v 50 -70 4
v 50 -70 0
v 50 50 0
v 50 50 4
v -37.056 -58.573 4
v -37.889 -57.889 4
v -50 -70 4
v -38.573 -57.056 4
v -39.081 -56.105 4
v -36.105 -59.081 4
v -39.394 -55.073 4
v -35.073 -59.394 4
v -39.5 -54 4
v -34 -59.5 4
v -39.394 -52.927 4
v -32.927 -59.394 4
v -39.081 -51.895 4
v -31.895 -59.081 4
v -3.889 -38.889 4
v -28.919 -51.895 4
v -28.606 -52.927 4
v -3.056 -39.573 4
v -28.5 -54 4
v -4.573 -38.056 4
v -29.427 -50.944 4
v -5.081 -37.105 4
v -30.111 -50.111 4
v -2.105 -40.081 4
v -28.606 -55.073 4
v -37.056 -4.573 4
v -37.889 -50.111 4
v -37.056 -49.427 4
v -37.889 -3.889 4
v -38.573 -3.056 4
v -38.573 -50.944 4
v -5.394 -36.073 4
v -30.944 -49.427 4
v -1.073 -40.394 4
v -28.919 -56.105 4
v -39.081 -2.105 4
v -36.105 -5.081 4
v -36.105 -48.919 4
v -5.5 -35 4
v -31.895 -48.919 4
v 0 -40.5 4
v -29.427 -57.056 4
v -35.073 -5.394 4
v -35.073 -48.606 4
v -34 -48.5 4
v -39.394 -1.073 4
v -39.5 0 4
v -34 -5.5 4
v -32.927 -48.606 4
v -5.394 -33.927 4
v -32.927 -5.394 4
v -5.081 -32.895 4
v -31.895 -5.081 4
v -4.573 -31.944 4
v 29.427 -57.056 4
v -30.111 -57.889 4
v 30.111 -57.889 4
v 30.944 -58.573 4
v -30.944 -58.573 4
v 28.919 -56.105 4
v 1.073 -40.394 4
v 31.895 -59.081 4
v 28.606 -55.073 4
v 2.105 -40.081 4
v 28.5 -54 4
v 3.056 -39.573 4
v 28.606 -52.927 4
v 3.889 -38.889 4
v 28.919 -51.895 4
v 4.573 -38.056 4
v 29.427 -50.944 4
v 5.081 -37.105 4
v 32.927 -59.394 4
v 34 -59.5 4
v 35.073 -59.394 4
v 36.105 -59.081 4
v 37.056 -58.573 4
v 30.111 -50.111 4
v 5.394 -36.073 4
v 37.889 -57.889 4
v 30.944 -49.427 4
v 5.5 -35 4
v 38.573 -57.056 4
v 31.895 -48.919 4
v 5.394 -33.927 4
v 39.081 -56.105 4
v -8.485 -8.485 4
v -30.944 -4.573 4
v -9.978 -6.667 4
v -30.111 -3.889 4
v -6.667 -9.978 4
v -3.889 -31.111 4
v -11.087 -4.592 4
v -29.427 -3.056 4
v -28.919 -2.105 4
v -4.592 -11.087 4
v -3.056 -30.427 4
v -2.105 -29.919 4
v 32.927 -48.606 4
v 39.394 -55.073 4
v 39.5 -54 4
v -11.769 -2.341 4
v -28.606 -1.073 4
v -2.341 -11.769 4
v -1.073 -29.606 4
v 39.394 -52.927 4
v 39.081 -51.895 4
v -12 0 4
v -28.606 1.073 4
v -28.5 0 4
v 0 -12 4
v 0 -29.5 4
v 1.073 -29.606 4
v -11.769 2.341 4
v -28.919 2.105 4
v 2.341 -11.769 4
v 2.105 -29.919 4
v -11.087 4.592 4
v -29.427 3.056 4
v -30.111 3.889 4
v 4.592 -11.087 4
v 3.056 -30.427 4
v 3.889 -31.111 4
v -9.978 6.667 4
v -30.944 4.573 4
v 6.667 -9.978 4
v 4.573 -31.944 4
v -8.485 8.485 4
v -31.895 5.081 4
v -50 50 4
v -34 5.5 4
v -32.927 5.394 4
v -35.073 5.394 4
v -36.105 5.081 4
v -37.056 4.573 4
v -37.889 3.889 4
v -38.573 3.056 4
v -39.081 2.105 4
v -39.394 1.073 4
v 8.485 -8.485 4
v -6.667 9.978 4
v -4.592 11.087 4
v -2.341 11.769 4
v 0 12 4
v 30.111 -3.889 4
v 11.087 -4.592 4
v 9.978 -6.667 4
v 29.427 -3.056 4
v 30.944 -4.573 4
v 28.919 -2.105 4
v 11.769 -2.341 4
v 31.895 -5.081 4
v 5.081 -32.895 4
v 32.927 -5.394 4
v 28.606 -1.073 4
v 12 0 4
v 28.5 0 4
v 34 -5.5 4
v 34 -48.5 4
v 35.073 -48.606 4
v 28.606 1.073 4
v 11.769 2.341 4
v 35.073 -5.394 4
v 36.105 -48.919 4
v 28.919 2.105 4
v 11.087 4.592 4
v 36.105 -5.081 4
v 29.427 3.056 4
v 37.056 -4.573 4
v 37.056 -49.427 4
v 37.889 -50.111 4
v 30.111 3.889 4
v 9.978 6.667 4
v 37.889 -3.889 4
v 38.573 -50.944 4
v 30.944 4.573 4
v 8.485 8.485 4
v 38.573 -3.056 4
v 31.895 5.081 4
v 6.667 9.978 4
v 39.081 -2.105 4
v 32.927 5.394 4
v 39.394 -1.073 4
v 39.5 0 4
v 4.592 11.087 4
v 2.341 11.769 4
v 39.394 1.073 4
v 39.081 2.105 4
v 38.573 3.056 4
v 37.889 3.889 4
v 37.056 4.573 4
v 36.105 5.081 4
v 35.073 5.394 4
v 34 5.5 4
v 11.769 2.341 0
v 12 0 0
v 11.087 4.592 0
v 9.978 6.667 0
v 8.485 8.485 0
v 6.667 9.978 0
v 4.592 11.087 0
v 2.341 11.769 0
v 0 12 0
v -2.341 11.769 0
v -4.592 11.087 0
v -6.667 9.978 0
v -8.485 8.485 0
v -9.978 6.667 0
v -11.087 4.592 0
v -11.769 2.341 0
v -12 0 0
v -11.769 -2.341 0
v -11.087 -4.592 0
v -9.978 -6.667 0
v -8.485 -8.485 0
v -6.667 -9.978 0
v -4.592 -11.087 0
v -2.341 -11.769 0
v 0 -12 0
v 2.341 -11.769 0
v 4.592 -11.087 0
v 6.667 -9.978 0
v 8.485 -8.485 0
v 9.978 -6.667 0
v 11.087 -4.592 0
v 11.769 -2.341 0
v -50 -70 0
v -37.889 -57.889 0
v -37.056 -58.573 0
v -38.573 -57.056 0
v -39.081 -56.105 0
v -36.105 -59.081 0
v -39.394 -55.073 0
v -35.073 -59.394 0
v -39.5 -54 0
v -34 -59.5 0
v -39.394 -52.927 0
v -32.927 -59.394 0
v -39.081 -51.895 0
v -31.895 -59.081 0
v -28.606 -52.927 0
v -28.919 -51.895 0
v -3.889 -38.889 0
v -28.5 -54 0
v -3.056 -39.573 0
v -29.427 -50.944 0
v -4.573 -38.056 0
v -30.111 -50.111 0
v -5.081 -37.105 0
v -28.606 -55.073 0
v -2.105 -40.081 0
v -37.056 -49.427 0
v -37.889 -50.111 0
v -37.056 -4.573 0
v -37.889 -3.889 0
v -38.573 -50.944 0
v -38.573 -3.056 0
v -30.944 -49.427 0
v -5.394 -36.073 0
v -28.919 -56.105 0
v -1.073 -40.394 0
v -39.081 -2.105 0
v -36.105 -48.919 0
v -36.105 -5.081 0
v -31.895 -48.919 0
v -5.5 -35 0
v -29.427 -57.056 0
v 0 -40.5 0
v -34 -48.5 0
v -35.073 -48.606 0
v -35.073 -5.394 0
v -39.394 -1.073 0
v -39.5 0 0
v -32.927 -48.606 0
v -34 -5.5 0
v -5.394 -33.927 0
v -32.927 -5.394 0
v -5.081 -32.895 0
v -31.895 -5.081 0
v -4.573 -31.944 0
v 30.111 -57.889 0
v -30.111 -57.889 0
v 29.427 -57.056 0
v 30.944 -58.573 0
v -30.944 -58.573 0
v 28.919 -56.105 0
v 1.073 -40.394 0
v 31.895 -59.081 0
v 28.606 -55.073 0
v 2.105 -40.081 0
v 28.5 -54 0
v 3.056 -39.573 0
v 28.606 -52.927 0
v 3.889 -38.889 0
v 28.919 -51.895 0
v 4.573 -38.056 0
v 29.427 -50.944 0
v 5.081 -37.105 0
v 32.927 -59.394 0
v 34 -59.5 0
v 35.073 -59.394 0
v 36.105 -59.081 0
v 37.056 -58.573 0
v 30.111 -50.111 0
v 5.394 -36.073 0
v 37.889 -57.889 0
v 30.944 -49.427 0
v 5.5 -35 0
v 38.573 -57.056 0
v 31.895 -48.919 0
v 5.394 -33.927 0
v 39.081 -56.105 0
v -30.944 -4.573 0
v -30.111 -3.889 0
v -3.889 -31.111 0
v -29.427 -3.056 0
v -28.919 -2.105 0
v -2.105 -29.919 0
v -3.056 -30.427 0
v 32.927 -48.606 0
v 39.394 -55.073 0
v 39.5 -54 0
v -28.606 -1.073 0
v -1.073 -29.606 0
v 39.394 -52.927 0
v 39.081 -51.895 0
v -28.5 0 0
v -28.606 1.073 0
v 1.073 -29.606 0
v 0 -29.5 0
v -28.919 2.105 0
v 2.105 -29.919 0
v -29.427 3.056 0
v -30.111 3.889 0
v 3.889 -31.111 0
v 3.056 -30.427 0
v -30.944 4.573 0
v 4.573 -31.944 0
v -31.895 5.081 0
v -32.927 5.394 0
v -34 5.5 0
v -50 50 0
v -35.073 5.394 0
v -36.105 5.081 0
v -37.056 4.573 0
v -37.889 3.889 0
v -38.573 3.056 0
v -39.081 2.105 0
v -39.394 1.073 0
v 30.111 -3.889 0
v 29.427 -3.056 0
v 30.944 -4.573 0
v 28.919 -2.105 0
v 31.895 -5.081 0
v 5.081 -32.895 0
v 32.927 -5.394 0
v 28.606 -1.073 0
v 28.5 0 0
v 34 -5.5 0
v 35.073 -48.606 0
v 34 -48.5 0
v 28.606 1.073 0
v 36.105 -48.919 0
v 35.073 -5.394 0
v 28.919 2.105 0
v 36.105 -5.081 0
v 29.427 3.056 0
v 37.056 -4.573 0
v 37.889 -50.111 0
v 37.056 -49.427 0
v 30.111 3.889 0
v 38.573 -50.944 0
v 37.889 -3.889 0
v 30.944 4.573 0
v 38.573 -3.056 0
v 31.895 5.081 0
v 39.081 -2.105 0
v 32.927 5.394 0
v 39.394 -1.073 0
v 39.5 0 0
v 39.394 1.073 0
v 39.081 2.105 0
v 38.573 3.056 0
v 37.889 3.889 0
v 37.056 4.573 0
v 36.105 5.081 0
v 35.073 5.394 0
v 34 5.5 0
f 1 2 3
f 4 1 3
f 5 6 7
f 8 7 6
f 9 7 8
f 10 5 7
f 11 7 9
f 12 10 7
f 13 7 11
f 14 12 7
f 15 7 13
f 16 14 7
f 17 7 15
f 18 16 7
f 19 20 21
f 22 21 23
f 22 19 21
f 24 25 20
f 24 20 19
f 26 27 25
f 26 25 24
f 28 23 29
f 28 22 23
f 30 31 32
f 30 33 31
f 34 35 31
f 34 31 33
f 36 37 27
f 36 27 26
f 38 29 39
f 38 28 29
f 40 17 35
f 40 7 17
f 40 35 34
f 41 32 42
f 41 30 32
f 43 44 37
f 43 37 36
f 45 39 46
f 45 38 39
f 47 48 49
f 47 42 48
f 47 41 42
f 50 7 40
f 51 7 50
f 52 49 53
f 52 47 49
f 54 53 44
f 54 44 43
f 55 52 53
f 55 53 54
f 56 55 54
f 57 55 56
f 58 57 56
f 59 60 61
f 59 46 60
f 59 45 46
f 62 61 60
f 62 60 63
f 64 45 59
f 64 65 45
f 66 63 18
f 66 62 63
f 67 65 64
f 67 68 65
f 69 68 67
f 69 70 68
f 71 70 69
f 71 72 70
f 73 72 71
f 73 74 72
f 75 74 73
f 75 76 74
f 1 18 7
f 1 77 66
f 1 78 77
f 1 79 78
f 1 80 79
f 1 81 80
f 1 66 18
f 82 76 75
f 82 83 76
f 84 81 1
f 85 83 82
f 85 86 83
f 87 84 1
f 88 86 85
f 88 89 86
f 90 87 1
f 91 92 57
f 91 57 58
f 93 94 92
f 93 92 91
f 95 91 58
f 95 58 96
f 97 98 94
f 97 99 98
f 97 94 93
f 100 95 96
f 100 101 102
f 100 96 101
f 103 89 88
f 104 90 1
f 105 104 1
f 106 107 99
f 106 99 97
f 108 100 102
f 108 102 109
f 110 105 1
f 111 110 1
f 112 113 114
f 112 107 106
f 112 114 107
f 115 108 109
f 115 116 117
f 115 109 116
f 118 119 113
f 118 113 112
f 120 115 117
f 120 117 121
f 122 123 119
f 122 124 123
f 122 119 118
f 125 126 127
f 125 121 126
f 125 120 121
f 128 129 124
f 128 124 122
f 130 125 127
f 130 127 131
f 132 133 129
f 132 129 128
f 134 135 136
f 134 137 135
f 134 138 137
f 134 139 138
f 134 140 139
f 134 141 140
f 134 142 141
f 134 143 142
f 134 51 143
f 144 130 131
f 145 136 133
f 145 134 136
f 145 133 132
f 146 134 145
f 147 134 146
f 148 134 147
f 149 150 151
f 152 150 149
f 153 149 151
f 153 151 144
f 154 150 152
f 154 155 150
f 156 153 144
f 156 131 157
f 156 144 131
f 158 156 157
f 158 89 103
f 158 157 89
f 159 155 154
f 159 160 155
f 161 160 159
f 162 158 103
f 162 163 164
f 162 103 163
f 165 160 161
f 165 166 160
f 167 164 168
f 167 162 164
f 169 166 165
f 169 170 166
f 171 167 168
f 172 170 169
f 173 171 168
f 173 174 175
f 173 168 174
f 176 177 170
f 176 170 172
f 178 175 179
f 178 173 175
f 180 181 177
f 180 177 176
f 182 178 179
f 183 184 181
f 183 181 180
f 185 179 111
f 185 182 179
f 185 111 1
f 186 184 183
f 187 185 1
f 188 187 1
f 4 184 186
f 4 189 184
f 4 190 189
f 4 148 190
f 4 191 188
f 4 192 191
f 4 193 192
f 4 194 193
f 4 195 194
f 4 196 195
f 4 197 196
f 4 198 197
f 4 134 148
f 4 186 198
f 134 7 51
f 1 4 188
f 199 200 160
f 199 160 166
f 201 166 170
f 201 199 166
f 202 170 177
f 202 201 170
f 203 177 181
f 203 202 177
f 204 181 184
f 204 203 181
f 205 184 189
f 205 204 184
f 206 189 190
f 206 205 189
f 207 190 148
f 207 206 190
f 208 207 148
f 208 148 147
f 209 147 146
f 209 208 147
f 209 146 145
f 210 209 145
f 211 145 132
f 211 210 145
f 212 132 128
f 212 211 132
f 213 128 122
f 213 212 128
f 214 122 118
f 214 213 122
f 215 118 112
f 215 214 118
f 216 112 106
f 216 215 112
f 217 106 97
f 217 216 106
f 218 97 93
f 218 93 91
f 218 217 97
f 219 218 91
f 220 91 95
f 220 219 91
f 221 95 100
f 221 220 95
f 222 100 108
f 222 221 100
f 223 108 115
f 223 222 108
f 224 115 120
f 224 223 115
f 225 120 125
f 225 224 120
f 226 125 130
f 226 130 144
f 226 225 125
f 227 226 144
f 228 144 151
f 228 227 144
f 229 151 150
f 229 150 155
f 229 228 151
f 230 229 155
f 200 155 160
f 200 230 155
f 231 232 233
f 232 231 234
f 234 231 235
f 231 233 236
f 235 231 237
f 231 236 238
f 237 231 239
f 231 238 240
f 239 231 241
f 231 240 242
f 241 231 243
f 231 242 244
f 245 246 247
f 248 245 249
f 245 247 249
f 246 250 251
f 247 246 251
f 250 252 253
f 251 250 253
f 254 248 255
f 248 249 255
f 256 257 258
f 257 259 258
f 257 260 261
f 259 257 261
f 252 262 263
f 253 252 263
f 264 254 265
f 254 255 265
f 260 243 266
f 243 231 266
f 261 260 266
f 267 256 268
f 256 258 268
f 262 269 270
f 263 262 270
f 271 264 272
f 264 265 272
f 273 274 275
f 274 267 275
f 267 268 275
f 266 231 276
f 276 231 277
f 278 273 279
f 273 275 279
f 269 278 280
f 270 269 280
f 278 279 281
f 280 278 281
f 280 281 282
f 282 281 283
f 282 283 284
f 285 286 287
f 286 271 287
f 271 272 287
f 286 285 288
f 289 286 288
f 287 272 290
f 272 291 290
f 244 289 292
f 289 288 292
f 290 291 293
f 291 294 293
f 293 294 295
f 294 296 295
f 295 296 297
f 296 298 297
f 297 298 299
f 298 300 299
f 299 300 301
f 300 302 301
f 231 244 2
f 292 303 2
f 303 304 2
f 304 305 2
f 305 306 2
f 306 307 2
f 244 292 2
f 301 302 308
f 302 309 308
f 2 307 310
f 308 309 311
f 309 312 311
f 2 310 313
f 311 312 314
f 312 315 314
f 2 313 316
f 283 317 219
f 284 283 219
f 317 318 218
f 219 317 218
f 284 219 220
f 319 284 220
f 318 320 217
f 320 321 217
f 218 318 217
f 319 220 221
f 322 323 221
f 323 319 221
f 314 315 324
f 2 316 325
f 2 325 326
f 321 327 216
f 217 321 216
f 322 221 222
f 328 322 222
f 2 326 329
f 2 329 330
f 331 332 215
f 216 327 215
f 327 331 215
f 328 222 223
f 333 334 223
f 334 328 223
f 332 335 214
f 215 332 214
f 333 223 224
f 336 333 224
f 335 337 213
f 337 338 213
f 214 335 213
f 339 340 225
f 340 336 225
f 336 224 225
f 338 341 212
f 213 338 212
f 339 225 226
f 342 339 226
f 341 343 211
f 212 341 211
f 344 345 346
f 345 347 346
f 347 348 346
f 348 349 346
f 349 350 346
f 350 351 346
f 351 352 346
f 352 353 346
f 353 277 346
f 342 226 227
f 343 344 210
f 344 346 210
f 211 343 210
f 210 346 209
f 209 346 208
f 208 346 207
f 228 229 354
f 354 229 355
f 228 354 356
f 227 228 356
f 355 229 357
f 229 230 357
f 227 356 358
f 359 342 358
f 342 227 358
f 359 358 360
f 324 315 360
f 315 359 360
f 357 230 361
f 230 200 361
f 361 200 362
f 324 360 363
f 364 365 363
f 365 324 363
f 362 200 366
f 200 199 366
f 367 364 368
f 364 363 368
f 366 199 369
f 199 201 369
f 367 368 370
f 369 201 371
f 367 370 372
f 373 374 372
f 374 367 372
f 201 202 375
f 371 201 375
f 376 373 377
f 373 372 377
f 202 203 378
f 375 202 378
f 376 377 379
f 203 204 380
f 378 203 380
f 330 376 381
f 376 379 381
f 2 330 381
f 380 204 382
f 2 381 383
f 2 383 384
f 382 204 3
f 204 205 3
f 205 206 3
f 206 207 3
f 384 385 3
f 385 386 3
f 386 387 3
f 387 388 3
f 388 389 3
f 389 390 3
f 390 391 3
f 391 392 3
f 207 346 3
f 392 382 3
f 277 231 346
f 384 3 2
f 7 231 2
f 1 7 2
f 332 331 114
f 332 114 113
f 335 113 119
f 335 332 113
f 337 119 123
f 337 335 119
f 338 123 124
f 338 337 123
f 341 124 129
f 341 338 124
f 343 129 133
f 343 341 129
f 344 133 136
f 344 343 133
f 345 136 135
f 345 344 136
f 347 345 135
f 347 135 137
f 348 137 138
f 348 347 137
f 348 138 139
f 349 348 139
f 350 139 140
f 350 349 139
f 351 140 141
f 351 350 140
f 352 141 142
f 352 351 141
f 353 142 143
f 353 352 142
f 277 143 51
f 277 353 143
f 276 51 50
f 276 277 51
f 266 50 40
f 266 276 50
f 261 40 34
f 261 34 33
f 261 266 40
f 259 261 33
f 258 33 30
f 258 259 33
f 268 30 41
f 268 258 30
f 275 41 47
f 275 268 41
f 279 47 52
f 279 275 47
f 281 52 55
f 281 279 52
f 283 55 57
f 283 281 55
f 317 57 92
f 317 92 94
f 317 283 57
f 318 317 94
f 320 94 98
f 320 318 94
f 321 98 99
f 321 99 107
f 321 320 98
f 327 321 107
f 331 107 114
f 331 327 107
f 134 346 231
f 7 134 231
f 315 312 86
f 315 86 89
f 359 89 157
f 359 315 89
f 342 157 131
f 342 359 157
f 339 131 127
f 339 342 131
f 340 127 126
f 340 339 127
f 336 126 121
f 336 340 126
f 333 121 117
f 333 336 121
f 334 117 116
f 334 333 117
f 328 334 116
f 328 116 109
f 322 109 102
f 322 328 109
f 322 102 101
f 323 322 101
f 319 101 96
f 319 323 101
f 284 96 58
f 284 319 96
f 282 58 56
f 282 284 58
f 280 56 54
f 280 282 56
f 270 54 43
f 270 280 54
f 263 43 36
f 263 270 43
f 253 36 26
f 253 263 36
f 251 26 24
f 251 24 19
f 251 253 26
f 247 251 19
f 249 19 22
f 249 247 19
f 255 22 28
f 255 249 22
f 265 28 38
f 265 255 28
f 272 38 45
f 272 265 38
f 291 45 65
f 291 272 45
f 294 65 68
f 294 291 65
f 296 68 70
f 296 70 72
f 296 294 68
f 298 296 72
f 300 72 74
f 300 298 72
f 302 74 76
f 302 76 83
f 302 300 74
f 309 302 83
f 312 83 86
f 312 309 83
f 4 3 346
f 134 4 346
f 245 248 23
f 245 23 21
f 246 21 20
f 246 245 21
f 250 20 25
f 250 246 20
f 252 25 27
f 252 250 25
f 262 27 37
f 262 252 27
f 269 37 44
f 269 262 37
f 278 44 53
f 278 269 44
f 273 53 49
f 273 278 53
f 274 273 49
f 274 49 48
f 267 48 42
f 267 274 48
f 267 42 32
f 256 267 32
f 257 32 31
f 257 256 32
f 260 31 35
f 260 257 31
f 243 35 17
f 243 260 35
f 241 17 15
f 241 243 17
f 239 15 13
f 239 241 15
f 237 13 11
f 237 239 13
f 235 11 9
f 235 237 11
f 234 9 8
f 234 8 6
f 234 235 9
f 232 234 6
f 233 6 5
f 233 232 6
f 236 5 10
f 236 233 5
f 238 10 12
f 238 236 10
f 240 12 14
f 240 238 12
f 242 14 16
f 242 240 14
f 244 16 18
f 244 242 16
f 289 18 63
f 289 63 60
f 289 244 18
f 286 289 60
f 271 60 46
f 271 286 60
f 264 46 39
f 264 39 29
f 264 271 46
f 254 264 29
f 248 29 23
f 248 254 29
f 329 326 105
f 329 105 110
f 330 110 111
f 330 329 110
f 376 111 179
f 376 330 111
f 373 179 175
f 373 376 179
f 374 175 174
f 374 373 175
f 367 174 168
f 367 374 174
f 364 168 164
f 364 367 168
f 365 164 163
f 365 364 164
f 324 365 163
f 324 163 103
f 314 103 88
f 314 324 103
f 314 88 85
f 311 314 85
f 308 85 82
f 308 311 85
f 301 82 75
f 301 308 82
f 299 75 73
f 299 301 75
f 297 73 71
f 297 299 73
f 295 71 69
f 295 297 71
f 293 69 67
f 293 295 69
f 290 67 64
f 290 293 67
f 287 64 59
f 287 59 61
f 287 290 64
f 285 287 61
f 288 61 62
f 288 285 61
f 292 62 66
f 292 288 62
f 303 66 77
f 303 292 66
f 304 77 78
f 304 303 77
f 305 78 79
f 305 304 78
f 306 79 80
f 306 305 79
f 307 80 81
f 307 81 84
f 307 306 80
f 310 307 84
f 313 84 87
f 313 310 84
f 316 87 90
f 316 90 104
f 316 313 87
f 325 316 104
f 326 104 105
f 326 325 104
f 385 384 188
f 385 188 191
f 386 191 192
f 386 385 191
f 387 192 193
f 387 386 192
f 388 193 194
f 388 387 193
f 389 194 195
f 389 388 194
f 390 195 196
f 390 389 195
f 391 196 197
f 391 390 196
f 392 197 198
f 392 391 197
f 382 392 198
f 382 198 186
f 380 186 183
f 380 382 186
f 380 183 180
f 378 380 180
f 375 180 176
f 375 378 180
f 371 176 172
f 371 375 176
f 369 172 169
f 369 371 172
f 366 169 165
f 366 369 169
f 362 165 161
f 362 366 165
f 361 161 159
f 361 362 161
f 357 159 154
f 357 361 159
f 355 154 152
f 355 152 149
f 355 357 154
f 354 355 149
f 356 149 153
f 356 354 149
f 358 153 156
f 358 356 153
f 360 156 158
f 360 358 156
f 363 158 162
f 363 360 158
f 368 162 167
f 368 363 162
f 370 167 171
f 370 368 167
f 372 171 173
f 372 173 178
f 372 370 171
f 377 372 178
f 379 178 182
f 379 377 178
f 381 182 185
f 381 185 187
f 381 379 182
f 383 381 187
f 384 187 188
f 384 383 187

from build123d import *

# Parameters (mm, degrees)
F0_R     = 5.5
F0_R_2   = 12
F1_DEPTH = 4


with BuildPart() as f1:
    # F0 (on Top) → F1 (new body)
    with BuildSketch(Plane.XY):
        Polygon((50, 50), (0, 50), (-50, 50), (-50, -70), (0, -70), (50, -70), align=None)
        with Locations((-34, -54)):
            Circle(F0_R, mode=Mode.SUBTRACT)
        with Locations((34, -54)):
            Circle(F0_R, mode=Mode.SUBTRACT)
        with Locations((0, -35)):
            Circle(F0_R, mode=Mode.SUBTRACT)
        with Locations((-34, 0)):
            Circle(F0_R, mode=Mode.SUBTRACT)
        Circle(F0_R_2, mode=Mode.SUBTRACT)
        with Locations((34, 0)):
            Circle(F0_R, mode=Mode.SUBTRACT)
    extrude(amount=F1_DEPTH)


solid = f1.part
